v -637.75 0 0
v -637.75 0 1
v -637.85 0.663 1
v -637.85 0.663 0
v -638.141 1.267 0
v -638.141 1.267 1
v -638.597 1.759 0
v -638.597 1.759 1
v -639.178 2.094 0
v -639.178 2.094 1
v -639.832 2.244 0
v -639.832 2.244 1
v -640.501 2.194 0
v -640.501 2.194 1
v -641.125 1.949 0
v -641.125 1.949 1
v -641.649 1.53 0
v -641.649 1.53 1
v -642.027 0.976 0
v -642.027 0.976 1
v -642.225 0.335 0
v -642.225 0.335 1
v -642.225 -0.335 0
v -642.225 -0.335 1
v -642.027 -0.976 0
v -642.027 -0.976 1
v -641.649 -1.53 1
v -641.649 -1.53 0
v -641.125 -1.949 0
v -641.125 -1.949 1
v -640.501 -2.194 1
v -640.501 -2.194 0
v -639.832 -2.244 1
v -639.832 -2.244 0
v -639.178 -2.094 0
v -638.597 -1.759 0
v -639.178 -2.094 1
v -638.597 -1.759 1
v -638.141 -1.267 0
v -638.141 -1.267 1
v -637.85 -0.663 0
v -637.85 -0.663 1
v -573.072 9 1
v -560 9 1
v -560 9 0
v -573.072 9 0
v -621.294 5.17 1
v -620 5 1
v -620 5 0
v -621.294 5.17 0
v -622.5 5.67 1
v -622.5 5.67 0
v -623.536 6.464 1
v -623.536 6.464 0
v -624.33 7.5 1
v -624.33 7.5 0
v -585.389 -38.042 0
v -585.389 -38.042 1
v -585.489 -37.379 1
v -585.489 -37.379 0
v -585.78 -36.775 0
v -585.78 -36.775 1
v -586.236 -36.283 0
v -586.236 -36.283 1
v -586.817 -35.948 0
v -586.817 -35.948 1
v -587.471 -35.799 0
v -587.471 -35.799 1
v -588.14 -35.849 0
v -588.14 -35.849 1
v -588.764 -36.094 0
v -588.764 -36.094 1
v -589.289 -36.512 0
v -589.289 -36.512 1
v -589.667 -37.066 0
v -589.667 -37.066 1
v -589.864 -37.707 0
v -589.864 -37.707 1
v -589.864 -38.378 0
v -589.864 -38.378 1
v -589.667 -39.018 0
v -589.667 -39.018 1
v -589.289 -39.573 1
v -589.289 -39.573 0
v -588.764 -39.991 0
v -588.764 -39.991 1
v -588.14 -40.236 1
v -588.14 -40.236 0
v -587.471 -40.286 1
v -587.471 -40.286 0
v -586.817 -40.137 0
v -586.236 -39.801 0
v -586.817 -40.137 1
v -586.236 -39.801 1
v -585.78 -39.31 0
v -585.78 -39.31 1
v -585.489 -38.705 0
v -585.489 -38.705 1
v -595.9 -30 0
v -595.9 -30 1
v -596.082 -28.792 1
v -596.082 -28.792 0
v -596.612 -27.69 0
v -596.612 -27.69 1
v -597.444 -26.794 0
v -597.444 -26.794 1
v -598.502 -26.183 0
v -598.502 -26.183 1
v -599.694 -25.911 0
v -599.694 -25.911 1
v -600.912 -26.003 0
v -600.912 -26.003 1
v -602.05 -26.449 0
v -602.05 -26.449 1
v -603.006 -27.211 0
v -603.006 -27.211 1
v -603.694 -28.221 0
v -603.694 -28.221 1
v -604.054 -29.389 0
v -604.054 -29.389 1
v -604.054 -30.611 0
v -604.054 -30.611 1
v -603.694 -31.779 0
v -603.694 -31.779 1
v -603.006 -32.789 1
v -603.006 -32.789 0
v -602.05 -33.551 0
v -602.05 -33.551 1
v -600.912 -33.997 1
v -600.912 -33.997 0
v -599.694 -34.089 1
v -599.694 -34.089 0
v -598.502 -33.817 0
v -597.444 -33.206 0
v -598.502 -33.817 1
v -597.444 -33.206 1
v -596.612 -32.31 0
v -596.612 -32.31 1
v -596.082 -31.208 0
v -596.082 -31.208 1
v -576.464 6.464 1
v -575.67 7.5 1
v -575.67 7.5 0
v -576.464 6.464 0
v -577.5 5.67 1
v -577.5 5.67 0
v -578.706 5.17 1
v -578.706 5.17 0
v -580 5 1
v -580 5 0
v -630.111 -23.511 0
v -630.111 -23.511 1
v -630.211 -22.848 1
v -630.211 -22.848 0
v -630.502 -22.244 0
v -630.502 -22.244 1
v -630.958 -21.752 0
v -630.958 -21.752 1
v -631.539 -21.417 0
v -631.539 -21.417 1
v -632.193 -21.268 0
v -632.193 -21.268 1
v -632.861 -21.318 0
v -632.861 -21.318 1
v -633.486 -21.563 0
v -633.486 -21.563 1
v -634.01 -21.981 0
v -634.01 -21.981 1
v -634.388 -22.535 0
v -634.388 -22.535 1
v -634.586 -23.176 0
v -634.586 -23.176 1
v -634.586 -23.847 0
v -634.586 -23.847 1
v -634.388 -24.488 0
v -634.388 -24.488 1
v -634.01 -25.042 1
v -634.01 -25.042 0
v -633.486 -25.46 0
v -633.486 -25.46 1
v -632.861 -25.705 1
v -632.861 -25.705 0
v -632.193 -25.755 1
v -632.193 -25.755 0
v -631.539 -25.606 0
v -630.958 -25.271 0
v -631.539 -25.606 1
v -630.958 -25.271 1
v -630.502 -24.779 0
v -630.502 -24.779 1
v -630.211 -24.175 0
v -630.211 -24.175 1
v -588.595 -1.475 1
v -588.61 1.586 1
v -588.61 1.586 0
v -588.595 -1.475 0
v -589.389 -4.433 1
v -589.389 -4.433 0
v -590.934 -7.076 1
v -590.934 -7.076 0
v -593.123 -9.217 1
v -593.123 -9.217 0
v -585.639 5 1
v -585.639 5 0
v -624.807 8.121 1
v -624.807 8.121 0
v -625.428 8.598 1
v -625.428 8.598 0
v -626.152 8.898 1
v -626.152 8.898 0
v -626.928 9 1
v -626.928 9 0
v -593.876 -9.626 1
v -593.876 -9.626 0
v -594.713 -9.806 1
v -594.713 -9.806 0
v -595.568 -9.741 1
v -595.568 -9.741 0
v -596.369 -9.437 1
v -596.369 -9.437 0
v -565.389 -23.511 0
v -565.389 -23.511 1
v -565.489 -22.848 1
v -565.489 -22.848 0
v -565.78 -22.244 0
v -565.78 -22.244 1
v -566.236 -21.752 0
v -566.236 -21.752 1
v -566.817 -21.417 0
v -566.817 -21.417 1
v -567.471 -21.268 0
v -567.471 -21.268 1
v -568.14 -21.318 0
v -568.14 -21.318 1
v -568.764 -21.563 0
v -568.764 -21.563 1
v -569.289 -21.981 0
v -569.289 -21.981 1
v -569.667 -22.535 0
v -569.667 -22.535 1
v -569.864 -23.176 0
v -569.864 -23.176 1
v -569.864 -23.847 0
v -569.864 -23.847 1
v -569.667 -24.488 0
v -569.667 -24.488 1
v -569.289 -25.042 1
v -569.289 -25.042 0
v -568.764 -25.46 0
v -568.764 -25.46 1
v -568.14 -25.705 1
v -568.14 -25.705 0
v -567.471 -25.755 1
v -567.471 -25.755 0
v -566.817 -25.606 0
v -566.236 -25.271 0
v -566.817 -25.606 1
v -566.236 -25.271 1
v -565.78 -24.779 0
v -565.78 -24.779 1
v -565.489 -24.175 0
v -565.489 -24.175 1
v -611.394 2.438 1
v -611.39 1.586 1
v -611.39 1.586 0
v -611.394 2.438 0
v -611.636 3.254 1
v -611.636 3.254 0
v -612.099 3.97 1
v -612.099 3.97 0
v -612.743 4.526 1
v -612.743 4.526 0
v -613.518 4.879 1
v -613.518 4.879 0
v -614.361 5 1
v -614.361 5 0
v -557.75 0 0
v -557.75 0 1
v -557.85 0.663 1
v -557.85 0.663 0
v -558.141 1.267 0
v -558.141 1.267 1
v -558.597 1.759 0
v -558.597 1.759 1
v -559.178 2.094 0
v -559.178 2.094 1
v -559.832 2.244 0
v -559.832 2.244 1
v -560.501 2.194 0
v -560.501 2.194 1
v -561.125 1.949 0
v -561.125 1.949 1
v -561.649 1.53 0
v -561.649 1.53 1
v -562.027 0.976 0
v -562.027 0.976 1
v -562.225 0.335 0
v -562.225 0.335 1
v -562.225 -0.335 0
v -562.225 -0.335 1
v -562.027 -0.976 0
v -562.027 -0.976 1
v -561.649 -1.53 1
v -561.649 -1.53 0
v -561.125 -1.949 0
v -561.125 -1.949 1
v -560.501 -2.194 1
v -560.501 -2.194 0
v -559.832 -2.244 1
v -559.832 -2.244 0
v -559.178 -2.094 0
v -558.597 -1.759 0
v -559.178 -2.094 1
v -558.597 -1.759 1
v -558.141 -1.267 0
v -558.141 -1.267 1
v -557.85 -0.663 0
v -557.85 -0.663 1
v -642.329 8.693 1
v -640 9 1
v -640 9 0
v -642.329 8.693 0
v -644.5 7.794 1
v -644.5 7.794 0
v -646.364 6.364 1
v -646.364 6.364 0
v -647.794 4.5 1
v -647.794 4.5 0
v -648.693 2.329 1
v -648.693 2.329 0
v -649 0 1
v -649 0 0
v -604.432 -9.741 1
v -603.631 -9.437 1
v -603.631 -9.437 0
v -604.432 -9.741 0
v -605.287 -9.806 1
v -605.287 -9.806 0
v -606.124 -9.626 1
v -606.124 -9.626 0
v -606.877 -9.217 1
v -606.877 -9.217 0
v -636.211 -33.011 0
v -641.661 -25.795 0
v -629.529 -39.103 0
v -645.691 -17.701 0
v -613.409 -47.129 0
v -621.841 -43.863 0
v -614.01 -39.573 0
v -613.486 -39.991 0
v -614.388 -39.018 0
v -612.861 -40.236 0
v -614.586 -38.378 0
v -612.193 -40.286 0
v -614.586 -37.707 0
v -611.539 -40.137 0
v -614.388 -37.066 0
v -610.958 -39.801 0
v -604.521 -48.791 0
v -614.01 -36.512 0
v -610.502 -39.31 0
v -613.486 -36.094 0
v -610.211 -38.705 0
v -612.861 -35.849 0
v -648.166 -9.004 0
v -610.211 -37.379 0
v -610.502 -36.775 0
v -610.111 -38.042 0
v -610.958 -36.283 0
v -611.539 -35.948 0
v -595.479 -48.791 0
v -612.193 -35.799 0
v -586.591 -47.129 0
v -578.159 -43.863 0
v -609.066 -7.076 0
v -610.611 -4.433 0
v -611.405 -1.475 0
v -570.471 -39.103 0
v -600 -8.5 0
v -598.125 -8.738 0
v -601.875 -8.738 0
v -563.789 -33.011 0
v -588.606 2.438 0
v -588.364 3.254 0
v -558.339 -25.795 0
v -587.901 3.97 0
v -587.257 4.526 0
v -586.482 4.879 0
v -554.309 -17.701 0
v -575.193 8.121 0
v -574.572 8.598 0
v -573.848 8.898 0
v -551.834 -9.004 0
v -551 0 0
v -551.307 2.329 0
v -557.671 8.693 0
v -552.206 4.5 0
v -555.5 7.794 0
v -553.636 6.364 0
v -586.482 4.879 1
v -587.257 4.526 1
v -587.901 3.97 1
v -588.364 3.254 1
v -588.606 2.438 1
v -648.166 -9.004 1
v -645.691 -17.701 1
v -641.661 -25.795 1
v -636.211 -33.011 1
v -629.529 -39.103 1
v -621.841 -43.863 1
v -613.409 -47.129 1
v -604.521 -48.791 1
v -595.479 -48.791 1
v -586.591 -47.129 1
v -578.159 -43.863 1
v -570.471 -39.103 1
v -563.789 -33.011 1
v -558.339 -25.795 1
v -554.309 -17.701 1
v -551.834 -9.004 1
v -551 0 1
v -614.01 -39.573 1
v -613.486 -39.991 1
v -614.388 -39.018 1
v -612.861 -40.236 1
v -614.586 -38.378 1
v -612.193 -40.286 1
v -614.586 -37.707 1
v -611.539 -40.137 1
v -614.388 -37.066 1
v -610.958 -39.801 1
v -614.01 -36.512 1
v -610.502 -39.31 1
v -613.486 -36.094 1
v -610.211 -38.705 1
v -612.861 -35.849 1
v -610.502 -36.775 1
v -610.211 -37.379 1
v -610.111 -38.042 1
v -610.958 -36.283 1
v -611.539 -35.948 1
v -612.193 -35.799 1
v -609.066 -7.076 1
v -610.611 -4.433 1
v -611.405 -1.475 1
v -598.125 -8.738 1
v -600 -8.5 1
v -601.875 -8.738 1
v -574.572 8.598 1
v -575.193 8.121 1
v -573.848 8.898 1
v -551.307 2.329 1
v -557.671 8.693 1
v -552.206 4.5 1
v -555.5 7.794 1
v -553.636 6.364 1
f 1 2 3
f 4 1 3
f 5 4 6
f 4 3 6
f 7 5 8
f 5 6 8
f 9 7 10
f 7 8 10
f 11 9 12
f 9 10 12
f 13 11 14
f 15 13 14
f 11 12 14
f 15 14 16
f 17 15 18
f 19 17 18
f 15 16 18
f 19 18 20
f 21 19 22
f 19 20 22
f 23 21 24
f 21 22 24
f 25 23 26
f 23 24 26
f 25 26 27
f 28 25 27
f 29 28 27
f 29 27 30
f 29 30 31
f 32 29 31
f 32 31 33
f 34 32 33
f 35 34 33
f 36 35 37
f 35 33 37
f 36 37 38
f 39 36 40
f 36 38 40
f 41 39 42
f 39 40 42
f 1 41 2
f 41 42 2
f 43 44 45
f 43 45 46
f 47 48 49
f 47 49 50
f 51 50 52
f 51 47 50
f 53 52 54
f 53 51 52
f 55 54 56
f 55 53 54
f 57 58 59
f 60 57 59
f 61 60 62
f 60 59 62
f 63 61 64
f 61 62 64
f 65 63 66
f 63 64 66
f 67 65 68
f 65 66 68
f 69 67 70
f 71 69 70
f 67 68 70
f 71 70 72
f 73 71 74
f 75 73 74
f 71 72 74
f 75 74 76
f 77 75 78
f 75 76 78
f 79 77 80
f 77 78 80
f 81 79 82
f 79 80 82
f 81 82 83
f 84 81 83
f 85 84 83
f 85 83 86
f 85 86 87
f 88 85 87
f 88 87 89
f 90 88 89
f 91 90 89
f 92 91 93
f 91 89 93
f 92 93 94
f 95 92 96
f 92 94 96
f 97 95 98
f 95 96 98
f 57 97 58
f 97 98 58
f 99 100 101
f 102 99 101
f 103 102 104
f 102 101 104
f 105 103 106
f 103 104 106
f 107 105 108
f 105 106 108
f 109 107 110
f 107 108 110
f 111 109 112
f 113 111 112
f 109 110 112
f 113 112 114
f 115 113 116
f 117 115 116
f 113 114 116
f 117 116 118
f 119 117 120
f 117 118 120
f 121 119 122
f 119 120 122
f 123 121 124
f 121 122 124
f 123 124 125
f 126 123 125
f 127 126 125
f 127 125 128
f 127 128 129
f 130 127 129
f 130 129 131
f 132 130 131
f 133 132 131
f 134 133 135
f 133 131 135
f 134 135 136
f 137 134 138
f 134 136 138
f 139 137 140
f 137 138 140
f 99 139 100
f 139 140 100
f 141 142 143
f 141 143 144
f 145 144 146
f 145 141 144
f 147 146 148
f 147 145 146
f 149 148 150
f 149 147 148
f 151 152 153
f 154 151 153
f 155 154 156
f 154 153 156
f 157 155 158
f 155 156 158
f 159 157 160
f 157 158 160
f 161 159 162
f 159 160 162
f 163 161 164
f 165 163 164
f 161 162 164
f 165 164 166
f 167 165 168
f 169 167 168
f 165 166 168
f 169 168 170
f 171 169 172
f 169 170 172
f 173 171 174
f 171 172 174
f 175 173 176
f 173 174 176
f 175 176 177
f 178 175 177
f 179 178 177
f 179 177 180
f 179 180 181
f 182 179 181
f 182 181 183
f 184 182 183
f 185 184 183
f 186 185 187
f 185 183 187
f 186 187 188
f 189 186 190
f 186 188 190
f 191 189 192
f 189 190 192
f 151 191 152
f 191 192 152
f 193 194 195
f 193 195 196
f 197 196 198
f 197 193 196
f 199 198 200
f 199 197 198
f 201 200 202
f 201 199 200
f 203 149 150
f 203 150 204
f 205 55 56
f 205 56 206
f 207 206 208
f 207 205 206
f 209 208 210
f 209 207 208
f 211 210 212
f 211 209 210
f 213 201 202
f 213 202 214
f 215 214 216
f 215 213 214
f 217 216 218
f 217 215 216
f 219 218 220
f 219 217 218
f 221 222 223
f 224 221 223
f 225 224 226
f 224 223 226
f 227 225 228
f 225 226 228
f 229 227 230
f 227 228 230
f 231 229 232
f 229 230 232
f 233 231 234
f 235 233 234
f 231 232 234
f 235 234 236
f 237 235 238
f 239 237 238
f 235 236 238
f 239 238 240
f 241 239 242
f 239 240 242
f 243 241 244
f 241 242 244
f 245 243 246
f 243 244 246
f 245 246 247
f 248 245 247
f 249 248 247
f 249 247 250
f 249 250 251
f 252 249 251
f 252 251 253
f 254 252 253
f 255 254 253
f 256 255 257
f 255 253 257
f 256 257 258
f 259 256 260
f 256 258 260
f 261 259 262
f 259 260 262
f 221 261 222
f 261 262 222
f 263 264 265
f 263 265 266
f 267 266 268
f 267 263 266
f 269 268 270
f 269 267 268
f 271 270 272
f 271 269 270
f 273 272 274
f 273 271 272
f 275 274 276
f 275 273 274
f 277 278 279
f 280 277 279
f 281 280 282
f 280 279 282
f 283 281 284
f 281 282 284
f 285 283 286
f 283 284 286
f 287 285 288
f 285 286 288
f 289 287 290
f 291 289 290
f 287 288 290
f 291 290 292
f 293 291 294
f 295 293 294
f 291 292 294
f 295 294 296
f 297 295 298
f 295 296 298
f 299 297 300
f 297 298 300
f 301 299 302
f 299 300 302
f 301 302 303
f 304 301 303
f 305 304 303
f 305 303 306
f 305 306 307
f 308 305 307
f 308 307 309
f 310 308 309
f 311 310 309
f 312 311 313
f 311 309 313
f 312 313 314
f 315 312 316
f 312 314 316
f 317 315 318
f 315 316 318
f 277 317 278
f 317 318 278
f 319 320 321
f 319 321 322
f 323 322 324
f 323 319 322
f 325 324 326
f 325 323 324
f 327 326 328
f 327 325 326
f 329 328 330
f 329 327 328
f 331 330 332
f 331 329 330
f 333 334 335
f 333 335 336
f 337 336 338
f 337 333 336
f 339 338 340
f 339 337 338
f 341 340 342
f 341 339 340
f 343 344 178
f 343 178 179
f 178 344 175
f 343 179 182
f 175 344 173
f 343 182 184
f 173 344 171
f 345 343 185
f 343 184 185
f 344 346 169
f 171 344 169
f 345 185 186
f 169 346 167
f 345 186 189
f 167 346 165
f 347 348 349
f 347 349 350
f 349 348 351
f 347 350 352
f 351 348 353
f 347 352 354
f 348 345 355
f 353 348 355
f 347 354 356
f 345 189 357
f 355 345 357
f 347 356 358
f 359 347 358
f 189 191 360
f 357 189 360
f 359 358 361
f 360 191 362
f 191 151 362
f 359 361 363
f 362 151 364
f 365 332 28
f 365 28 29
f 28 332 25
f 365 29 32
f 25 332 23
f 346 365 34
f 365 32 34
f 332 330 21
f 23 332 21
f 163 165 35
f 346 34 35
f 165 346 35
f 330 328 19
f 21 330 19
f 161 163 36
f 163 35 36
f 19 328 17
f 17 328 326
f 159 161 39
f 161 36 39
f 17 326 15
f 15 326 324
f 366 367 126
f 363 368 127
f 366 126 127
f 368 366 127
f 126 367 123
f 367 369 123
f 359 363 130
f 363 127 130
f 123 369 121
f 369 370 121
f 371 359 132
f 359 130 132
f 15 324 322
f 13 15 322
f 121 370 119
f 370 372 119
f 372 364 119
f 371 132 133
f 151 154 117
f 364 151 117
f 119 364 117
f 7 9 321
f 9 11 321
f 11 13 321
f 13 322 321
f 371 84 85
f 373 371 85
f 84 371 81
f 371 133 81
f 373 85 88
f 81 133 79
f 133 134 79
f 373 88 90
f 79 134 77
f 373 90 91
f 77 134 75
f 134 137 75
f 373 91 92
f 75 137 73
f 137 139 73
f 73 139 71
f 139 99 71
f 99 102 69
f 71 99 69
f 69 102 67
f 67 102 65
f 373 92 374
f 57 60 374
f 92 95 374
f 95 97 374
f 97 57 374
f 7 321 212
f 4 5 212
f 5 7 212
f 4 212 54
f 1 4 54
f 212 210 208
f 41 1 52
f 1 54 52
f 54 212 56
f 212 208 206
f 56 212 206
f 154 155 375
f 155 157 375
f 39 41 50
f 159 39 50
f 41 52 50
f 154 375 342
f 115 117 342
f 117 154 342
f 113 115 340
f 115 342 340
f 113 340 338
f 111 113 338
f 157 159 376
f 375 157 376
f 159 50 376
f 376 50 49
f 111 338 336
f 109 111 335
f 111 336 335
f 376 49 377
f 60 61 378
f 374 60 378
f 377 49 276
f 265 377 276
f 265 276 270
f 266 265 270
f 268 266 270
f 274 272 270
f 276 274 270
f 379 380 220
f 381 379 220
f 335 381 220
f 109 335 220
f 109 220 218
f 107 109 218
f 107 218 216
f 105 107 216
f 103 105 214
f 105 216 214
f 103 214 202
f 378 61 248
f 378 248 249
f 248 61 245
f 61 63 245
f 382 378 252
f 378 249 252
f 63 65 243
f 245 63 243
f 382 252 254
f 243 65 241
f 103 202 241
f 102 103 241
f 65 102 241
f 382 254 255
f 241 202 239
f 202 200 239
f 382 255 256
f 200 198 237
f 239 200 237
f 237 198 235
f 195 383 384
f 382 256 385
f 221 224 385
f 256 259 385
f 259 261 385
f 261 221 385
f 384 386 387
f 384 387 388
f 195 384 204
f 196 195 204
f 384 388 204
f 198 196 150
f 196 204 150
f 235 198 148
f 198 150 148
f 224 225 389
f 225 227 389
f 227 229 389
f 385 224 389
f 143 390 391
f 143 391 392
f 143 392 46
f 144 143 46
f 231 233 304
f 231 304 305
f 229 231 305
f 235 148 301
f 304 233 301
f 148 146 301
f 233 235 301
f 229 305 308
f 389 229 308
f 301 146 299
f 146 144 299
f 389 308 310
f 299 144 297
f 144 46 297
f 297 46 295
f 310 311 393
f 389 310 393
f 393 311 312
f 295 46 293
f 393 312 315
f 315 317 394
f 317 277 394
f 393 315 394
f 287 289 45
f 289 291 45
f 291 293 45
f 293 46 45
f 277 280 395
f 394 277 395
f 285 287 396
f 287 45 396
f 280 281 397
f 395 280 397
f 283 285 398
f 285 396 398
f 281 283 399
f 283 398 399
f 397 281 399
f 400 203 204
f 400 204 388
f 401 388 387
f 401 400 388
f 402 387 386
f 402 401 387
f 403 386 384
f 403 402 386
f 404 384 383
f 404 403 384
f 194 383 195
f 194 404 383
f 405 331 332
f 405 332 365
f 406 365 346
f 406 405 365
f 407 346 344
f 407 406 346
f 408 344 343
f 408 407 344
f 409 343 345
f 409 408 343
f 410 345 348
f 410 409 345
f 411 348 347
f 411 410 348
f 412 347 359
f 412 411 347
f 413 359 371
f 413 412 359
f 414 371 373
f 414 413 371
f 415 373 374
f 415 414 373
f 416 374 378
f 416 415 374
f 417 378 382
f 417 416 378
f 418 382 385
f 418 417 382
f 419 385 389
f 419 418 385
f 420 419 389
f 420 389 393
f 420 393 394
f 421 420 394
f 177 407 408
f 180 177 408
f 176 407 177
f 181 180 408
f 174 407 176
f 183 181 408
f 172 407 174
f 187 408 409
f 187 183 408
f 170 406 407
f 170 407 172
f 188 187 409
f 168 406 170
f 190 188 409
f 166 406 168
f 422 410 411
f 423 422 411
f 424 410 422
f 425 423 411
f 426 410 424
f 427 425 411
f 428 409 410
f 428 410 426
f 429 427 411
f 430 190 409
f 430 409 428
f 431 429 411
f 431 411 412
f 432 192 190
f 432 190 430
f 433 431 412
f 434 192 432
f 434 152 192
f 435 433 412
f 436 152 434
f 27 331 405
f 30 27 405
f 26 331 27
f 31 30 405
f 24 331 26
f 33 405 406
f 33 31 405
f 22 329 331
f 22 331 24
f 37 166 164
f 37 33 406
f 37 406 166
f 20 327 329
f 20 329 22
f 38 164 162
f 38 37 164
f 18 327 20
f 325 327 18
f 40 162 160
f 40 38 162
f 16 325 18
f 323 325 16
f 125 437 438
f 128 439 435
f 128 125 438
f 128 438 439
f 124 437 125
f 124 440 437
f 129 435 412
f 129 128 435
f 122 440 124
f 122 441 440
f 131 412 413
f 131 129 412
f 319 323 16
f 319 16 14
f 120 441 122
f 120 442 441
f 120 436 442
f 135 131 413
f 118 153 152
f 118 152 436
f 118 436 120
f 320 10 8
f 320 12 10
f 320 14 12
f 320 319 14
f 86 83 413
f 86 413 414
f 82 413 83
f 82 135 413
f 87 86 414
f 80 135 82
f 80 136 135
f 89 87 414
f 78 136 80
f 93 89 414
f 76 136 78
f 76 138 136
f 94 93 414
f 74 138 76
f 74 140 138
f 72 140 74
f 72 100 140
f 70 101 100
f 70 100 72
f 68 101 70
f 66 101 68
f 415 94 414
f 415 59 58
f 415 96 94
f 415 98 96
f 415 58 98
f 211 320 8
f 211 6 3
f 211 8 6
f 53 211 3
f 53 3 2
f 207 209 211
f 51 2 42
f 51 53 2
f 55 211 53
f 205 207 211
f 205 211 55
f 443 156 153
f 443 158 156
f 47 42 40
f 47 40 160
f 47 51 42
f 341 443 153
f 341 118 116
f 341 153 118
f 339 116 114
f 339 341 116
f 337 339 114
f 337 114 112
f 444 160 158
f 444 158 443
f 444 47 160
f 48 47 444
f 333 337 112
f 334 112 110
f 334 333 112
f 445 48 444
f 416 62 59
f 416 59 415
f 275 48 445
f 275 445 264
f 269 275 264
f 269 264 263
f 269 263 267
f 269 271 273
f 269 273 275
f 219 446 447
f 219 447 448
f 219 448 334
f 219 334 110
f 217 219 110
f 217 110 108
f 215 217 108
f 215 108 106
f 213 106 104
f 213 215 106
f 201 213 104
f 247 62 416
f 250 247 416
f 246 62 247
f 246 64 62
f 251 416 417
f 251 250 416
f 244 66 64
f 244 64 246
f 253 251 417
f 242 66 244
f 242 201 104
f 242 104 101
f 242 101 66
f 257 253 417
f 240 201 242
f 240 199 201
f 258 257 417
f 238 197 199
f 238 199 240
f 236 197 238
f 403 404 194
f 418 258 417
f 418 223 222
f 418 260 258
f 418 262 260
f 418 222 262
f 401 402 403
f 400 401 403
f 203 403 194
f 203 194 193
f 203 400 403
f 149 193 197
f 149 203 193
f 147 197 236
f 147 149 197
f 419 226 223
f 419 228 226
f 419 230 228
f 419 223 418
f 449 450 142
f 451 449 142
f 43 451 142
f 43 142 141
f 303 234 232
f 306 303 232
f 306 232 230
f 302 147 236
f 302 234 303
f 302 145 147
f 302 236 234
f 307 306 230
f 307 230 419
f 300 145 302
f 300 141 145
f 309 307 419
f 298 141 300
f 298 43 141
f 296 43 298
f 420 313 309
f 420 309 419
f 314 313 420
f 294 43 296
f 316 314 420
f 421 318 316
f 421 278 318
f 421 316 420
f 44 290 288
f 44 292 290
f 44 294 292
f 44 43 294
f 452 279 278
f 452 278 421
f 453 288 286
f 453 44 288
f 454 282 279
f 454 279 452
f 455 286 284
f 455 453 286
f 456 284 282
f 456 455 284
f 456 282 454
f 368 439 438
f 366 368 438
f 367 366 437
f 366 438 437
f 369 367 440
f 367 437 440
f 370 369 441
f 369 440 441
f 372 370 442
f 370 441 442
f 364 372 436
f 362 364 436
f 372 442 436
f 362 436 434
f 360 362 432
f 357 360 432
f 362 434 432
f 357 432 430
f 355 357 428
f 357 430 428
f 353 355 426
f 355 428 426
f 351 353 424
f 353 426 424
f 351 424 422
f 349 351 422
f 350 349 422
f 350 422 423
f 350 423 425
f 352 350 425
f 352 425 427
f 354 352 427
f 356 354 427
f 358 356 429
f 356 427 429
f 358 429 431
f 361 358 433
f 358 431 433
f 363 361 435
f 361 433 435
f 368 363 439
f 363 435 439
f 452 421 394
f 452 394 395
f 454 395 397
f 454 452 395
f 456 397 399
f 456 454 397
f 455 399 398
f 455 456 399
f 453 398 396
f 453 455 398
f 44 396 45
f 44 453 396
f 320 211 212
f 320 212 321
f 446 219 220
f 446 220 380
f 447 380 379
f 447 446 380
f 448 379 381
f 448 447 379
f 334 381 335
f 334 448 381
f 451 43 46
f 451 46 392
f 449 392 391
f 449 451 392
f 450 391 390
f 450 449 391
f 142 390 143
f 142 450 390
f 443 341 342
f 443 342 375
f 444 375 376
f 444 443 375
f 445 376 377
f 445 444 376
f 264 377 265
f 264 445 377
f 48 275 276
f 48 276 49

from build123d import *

# Parameters (mm, degrees)
SKETCH_1_R      = 2.25
SKETCH_1_R_2    = 4.1
EXTRUDE_1_DEPTH = 1


with BuildPart() as part:
    # 草图1 → 凸台-拉伸1 (new body)
    with BuildSketch(Plane.XY.offset(1)):
        with BuildLine():
            Line((-614.361406616, 5), (-620, 5))
            ThreePointArc((-620, 5), (-622.5, 5.669872981), (-624.330127019, 7.5))
            ThreePointArc((-624.330127019, 7.5), (-625.42820323, 8.598076211), (-626.92820323, 9))
            Line((-626.92820323, 9), (-640, 9))
            ThreePointArc((-640, 9), (-646.363961031, 6.363961031), (-649, 0))
            ThreePointArc((-649, 0), (-600, -49), (-551, 0))
            ThreePointArc((-551, 0), (-553.636038969, 6.363961031), (-560, 9))
            Line((-560, 9), (-573.07179677, 9))
            ThreePointArc((-573.07179677, 9), (-574.57179677, 8.598076211), (-575.669872981, 7.5))
            ThreePointArc((-575.669872981, 7.5), (-577.5, 5.669872981), (-580, 5))
            Line((-580, 5), (-585.638593384, 5))
            ThreePointArc((-585.638593384, 5), (-587.901487472, 3.969596493), (-588.60991889, 1.586206897))
            ThreePointArc((-588.60991889, 1.586206897), (-589.388591149, -4.432606704), (-593.122606779, -9.216911765))
            ThreePointArc((-593.122606779, -9.216911765), (-594.713337054, -9.80559868), (-596.369078113, -9.4375))
            ThreePointArc((-596.369078113, -9.4375), (-600, -8.5), (-603.630921887, -9.4375))
            ThreePointArc((-603.630921887, -9.4375), (-605.286662946, -9.80559868), (-606.877393221, -9.216911765))
            ThreePointArc((-606.877393221, -9.216911765), (-610.611408851, -4.432606704), (-611.39008111, 1.586206897))
            ThreePointArc((-611.39008111, 1.586206897), (-612.098512528, 3.969596493), (-614.361406616, 5))
        make_face()
        with Locations((-640, 0)):
            Circle(SKETCH_1_R, mode=Mode.SUBTRACT)
        with Locations((-600, -30)):
            Circle(SKETCH_1_R_2, mode=Mode.SUBTRACT)
        with Locations((-567.639320225, -23.511410092)):
            Circle(SKETCH_1_R, mode=Mode.SUBTRACT)
        with Locations((-587.639320225, -38.042260652)):
            Circle(SKETCH_1_R, mode=Mode.SUBTRACT)
        with Locations((-612.360679775, -38.042260652)):
            Circle(SKETCH_1_R, mode=Mode.SUBTRACT)
        with Locations((-632.360679775, -23.511410092)):
            Circle(SKETCH_1_R, mode=Mode.SUBTRACT)
        with Locations((-560, 0)):
            Circle(SKETCH_1_R, mode=Mode.SUBTRACT)
    extrude(amount=-EXTRUDE_1_DEPTH)


solid = part.part
